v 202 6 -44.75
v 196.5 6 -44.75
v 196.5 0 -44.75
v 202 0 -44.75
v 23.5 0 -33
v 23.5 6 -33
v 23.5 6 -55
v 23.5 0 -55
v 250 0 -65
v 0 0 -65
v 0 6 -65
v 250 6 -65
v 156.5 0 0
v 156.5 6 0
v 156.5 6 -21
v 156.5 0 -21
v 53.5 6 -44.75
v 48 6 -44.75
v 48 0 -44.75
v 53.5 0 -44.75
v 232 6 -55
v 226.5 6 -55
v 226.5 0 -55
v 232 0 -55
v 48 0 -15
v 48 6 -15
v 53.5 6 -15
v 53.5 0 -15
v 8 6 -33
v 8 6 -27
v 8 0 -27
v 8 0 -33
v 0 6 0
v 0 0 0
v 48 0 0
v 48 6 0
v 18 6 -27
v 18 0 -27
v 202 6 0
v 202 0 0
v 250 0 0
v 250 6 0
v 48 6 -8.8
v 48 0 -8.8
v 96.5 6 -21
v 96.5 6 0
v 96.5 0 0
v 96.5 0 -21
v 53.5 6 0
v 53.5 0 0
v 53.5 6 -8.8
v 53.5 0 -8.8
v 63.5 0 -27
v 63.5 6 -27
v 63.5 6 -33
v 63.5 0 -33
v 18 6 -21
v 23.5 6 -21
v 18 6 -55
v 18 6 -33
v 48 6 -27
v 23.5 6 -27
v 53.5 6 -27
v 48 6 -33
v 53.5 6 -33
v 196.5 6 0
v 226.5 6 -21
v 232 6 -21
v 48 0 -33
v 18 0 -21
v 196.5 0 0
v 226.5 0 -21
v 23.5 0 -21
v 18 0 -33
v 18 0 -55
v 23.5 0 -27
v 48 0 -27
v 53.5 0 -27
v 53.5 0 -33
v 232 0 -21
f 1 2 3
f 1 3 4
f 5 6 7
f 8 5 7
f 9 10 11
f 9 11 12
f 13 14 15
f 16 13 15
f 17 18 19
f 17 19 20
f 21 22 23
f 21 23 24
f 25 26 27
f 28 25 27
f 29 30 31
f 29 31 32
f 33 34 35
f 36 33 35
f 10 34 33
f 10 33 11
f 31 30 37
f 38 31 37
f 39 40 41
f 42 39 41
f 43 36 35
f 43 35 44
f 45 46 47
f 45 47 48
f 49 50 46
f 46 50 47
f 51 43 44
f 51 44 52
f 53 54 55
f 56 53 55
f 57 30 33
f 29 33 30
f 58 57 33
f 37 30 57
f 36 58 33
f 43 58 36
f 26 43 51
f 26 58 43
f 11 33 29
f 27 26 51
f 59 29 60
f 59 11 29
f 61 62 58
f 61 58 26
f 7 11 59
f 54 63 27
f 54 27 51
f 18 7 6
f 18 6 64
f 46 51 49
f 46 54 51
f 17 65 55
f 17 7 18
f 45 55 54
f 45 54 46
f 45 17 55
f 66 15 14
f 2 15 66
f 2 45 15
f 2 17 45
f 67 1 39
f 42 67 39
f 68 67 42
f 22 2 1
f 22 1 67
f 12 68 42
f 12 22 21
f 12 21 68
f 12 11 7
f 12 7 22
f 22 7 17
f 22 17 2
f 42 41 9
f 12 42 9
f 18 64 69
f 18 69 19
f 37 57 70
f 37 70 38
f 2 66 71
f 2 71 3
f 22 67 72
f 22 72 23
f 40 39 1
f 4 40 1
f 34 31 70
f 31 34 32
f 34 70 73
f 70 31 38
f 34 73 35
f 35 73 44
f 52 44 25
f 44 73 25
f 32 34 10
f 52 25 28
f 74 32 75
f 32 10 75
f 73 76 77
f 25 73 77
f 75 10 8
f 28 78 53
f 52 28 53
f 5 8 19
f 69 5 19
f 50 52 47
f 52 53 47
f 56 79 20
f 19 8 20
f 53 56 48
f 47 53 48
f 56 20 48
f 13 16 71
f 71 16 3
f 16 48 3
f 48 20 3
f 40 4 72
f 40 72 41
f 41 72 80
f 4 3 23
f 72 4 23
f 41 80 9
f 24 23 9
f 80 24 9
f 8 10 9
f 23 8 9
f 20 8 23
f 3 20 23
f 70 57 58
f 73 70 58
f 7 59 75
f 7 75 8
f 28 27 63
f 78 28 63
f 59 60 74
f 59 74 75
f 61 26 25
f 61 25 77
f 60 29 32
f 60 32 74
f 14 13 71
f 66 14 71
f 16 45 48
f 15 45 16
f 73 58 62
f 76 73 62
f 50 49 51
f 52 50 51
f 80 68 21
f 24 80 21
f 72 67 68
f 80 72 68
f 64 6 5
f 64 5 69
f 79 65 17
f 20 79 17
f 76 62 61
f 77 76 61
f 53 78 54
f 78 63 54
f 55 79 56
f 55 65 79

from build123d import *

# Parameters (mm, degrees)
SKETCH1_W           = 250
SKETCH1_H           = 65
BOSS_EXTRUDE1_DEPTH = 6
SKETCH2_W           = 5.5
SKETCH2_H           = 34
SKETCH2_H_2         = 47.5
CUT_EXTRUDE1_DEPTH  = 259.381500886
SKETCH3_W           = 60
SKETCH3_H           = 21
CUT_EXTRUDE2_DEPTH  = 259.381500886
SKETCH4_W           = 55.5
SKETCH4_H           = 6
CUT_EXTRUDE3_DEPTH  = 259.381500886
SKETCH5_W           = 5.5
SKETCH5_H           = 6.2
BOSS_EXTRUDE2_DEPTH = 6


with BuildPart() as part:
    # Sketch1 → Boss-Extrude1 (new body)
    with BuildSketch(Plane(origin=(0, 0, 0), x_dir=(1, 0, 0), z_dir=(0, 1, 0))):
        with Locations((125, 32.5)):
            Rectangle(SKETCH1_W, SKETCH1_H)
    extrude(amount=BOSS_EXTRUDE1_DEPTH)

    # Sketch2 → Cut-Extrude1 (cut, through all)
    with BuildSketch(Plane(origin=(0, 6, 0), x_dir=(1, 0, 0), z_dir=(0, 1, 0))):
        with Locations((20.75, 38)):
            Rectangle(SKETCH2_W, SKETCH2_H)
        with Locations((50.75, 21)):
            Rectangle(SKETCH2_W, SKETCH2_H_2)
        with Locations((199.25, 21)):
            Rectangle(SKETCH2_W, SKETCH2_H_2)
        with Locations((229.25, 38)):
            Rectangle(SKETCH2_W, SKETCH2_H)
    extrude(amount=-CUT_EXTRUDE1_DEPTH, mode=Mode.SUBTRACT)

    # Sketch3 → Cut-Extrude2 (cut, through all)
    with BuildSketch(Plane(origin=(0, 6, 0), x_dir=(1, 0, 0), z_dir=(0, 1, 0))):
        with Locations((126.5, 10.5)):
            Rectangle(SKETCH3_W, SKETCH3_H)
    extrude(amount=-CUT_EXTRUDE2_DEPTH, mode=Mode.SUBTRACT)

    # Sketch4 → Cut-Extrude3 (cut, through all)
    with BuildSketch(Plane(origin=(0, 6, 0), x_dir=(1, 0, 0), z_dir=(0, 1, 0))):
        with Locations((35.75, 30)):
            Rectangle(SKETCH4_W, SKETCH4_H)
    extrude(amount=-CUT_EXTRUDE3_DEPTH, mode=Mode.SUBTRACT)

    # Sketch5 → Boss-Extrude2 (add)
    with BuildSketch(Plane(origin=(0, 6, 0), x_dir=(1, 0, 0), z_dir=(0, 1, 0))):
        with Locations((50.75, 11.9)):
            Rectangle(SKETCH5_W, SKETCH5_H)
    extrude(amount=-BOSS_EXTRUDE2_DEPTH)


solid = part.part
